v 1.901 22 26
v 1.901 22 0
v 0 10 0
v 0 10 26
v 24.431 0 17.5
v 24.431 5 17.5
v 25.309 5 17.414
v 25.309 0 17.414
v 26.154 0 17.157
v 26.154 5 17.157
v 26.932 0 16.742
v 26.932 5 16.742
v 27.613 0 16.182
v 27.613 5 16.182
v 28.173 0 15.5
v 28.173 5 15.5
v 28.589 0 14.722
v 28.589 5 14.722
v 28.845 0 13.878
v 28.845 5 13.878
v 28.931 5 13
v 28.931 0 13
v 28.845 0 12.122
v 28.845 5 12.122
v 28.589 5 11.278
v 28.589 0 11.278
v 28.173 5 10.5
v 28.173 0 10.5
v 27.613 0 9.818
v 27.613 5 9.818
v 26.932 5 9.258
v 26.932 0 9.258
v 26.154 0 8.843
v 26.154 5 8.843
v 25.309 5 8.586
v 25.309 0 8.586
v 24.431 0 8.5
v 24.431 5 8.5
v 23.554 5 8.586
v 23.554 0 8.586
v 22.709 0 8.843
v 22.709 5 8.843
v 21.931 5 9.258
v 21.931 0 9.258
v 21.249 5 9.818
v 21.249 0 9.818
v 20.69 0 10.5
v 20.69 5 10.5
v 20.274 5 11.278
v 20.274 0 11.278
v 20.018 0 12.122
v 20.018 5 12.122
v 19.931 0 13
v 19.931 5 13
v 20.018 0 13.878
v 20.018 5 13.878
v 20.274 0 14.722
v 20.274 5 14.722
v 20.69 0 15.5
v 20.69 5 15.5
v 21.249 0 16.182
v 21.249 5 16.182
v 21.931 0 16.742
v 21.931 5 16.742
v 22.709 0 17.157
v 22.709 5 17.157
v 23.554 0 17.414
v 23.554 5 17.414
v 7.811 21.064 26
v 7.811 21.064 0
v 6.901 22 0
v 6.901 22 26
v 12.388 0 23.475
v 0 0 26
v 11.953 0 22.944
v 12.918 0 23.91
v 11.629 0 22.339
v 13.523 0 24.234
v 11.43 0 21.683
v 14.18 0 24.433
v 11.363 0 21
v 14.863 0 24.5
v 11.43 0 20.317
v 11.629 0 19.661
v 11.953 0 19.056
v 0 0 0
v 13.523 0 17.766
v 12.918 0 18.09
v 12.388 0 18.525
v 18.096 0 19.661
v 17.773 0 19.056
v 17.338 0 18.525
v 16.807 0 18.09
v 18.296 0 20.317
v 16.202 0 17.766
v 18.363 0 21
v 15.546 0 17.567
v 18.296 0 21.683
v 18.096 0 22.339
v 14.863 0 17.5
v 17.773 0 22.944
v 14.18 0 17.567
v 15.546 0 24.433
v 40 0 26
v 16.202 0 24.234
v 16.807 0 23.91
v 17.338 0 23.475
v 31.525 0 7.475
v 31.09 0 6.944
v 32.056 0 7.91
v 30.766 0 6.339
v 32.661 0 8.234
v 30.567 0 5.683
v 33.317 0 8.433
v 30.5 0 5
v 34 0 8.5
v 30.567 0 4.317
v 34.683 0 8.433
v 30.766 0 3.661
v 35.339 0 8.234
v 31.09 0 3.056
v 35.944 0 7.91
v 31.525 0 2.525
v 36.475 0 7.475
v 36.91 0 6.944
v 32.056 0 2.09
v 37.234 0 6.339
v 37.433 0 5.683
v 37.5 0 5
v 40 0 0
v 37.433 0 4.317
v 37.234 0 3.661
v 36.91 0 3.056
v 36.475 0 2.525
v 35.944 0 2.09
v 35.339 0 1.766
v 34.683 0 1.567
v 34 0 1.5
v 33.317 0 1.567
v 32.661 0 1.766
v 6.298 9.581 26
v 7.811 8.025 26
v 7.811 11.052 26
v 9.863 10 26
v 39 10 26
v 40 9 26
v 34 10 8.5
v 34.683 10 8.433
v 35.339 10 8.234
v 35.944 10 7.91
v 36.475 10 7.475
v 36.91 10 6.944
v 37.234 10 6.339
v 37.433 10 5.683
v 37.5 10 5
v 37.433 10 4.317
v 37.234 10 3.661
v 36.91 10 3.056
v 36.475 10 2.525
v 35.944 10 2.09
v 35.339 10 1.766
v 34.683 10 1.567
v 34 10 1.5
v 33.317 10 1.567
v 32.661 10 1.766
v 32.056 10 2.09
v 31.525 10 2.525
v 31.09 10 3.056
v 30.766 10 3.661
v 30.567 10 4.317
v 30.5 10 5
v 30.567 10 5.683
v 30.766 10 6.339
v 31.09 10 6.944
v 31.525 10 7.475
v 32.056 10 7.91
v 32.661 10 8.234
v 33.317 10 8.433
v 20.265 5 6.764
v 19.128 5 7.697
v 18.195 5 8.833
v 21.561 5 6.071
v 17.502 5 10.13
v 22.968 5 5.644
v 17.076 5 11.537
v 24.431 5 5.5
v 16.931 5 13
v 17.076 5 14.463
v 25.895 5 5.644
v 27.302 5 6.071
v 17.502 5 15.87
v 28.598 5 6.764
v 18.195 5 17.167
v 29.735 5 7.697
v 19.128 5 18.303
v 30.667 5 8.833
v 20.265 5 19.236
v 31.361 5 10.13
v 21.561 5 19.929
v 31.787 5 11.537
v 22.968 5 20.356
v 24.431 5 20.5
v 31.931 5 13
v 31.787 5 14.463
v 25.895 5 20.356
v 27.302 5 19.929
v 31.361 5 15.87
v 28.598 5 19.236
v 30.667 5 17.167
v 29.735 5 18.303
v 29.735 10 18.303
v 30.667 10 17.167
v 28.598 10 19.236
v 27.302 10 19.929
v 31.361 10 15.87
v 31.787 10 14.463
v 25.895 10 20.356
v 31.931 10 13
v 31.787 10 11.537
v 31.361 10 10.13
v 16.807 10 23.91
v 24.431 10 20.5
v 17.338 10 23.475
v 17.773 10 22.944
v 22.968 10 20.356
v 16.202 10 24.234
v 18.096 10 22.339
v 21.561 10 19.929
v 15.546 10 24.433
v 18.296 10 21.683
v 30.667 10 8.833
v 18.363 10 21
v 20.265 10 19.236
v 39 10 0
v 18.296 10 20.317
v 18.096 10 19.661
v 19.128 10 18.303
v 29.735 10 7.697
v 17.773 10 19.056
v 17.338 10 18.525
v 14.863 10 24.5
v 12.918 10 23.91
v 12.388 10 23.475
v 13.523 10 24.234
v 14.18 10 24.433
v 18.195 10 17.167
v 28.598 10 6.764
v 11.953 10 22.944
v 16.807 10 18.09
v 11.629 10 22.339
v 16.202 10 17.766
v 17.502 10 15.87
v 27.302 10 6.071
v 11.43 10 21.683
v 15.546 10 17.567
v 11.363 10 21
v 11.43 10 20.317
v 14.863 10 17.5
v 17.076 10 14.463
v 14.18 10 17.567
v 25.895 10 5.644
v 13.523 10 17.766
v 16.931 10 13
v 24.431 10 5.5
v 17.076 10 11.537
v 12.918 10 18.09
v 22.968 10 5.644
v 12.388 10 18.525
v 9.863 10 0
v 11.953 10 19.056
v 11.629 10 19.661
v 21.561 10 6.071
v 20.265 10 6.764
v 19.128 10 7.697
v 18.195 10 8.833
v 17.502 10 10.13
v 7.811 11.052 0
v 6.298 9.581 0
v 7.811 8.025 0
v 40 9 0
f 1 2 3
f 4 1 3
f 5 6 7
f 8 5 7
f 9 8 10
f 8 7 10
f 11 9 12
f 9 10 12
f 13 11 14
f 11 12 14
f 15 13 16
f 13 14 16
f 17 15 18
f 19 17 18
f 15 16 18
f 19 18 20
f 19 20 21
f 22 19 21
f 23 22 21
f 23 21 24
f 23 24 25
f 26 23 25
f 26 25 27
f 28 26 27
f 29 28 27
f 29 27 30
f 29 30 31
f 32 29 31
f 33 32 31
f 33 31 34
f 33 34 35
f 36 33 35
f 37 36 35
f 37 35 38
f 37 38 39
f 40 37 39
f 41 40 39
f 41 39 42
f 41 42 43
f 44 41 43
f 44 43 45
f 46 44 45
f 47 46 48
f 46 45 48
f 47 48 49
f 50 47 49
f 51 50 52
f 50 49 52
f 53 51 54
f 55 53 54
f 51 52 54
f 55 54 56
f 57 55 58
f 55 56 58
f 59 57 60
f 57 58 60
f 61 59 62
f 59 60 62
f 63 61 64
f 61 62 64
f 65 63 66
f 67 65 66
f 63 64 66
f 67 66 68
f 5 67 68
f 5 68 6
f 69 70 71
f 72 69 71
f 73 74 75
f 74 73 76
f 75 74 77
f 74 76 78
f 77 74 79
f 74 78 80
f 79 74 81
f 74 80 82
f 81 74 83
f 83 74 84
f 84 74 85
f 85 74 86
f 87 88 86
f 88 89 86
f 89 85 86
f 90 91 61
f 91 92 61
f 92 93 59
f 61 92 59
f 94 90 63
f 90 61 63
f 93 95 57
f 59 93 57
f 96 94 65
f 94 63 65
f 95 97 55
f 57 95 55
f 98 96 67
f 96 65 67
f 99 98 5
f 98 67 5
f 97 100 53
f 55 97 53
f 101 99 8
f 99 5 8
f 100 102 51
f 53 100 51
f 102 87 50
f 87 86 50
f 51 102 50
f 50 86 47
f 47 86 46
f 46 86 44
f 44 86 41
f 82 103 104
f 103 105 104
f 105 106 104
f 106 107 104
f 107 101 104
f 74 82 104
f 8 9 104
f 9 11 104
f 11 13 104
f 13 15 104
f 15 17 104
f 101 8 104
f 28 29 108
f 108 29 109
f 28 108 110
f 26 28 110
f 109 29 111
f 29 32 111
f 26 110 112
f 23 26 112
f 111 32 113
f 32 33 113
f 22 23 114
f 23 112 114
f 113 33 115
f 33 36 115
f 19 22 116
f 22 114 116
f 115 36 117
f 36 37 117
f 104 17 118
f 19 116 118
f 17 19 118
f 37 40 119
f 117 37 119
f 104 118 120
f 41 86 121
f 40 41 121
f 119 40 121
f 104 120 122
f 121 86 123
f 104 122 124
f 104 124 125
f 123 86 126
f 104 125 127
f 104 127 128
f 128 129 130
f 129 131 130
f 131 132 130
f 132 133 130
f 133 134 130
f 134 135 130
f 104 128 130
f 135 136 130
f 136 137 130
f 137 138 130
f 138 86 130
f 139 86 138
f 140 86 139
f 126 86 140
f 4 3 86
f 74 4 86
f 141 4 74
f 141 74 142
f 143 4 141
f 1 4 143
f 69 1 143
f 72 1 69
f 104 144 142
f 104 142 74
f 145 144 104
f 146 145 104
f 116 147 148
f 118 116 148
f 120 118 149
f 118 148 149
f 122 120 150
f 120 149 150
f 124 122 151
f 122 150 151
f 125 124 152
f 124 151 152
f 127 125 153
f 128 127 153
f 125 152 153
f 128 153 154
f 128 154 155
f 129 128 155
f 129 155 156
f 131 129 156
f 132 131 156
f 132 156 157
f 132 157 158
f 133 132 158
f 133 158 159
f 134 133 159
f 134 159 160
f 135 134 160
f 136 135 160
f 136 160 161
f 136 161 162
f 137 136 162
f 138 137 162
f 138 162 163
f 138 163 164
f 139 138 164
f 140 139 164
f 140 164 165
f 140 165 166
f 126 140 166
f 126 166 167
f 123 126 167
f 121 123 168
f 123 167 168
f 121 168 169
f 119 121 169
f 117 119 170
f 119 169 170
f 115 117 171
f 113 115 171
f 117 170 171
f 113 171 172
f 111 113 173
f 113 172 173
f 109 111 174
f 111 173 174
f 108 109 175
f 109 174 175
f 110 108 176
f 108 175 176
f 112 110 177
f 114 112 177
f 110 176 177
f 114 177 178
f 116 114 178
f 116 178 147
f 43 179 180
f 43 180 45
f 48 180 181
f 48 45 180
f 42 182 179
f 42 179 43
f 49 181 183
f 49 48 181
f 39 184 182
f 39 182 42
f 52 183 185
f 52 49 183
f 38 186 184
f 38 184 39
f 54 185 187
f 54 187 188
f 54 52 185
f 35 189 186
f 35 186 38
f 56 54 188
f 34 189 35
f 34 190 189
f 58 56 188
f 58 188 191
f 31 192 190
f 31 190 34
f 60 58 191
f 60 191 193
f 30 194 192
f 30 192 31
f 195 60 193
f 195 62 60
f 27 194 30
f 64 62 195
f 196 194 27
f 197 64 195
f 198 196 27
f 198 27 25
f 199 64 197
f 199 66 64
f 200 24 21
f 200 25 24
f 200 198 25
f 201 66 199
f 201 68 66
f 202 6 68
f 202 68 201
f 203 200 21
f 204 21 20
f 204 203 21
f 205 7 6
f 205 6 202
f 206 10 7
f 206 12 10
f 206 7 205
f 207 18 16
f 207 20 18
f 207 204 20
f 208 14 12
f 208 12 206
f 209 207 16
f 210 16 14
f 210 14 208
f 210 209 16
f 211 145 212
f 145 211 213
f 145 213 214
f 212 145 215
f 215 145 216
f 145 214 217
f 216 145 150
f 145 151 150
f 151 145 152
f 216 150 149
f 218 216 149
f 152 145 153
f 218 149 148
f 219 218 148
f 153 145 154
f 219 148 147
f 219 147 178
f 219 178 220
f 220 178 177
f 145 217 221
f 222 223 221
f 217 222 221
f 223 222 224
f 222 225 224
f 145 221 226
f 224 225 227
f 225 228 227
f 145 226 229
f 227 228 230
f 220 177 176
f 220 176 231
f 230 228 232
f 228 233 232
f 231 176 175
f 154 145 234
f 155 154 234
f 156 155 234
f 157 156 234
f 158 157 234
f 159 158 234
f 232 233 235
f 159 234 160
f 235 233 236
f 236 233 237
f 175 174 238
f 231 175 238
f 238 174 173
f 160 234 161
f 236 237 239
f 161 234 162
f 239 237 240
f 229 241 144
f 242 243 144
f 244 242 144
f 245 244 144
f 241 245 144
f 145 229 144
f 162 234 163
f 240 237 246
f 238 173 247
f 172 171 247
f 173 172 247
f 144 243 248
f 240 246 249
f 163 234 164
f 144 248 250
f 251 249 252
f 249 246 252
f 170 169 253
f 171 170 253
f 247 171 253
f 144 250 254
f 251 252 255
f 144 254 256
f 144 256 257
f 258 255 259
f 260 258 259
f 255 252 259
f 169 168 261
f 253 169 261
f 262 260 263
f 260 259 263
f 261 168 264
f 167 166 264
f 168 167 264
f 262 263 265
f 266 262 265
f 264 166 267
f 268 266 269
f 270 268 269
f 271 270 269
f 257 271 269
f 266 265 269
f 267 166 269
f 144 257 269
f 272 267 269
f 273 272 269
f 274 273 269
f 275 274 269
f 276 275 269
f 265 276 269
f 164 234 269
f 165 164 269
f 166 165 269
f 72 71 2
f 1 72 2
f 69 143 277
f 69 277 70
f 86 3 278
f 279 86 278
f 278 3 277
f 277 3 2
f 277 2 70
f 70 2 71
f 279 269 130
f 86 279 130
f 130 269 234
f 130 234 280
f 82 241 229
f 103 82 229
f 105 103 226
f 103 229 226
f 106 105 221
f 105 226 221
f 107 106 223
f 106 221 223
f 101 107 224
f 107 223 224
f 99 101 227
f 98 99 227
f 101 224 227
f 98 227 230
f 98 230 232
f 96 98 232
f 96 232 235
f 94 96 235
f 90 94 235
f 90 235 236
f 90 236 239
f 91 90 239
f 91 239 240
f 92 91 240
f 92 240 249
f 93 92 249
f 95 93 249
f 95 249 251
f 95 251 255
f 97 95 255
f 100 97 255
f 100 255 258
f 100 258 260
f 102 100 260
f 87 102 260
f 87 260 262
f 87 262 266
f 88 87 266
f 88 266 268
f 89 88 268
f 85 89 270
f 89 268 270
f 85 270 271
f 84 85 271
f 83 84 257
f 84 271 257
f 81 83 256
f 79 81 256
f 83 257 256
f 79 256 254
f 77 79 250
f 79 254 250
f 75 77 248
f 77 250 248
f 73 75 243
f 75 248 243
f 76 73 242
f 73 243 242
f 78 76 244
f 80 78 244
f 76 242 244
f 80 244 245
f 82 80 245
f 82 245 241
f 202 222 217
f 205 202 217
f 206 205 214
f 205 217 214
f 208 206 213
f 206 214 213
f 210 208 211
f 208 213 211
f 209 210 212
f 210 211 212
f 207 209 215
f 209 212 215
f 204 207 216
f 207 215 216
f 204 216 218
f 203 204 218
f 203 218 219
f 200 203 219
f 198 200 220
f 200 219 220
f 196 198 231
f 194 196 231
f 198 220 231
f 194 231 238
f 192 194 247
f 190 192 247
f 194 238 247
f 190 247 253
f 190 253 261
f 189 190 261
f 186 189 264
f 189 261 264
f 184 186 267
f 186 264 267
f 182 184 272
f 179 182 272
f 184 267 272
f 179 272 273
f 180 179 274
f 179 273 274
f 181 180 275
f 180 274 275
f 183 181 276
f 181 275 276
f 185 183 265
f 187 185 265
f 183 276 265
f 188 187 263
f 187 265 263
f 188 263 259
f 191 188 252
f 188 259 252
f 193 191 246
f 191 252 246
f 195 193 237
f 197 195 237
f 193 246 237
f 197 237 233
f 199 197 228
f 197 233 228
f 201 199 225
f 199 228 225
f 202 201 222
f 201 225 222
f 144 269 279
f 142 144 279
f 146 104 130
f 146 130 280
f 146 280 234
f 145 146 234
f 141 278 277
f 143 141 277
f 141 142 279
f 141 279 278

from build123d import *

# Parameters (mm, degrees)
EXTRUDE_1_DEPTH     = 26
SKETCH_2_R          = 3.5
SKETCH_2_R_2        = 4.5
CUT_EXTRUDE_1_DEPTH = 26
SKETCH_2_3_R        = 7.5
SKETCH_2_3_R_2      = 4.5
CUT_EXTRUDE_2_DEPTH = 5


with BuildPart() as part:
    # 草图1 → 凸台-拉伸1 (new body)
    with BuildSketch(Plane.XY):
        Polygon((0, 0), (40, 0), (40, 9), (39, 10), (9.862873216, 10), (7.811286052, 8.025146032), (6.29823885, 9.580536944), (7.811286052, 11.052393193), (7.811286052, 21.063841402), (6.900613284, 22), (1.900613284, 22), (0, 10), align=None)
    extrude(amount=EXTRUDE_1_DEPTH)

    # 草图2 → 切除-拉伸1 (cut)
    with BuildSketch(Plane(origin=(0, 10, 0), x_dir=(1, 0, 0), z_dir=(0, 1, 0))):
        with Locations((34, -5)):
            Circle(SKETCH_2_R)
        with Locations((24.431436608, -13)):
            Circle(SKETCH_2_R_2)
        with Locations((14.862873216, -21)):
            Circle(SKETCH_2_R)
    extrude(amount=-CUT_EXTRUDE_1_DEPTH, mode=Mode.SUBTRACT)

    # 草图2<3> → 切除-拉伸2 (cut)
    with BuildSketch(Plane(origin=(0, 10, 0), x_dir=(1, 0, 0), z_dir=(0, 1, 0))):
        with Locations((24.431436608, -13)):
            Circle(SKETCH_2_3_R)
        with Locations((24.431436608, -13)):
            Circle(SKETCH_2_3_R_2, mode=Mode.SUBTRACT)
    extrude(amount=-CUT_EXTRUDE_2_DEPTH, mode=Mode.SUBTRACT)


solid = part.part
